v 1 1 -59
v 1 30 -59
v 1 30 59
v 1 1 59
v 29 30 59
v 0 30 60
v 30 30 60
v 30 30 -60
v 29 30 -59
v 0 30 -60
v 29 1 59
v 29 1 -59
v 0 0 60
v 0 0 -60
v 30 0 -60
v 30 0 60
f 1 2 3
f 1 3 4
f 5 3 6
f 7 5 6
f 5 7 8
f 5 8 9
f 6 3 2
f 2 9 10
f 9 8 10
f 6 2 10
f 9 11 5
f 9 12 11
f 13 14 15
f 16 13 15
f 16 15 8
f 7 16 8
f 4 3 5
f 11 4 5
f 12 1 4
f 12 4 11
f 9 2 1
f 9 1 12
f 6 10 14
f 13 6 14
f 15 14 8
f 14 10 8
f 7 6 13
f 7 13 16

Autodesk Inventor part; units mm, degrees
ref_plane "YZ Plane" through (0, 0, 0) normal (1, 0, 0) x (0, 1, 0)
ref_plane "XY Plane" through (0, 0, 0) normal (0, 0, 1) x (1, 0, 0)
sketch "Sketch1" plane through (0, 0, 0) normal (0, 0, 1) x (1, 0, 0)
  line L0 (0, 0) -> (30, 0)
  line L1 (30, 0) -> (30, 30)
  line L2 (30, 30) -> (0, 30)
  line L3 (0, 30) -> (0, 0)
  dimension "d0" = 30
  dimension "d1" = 30
extrude "Extrusion1" add sketch "Sketch1" along normal mid plane 120
ref_plane "Work Plane1" through (0, 15, 0) normal (0, 1, 0) x (-1, 0, 0)
split body "Split1" result two bodies by plane through (0, 15, 0) normal (0, 1, 0) first body at (20, 15.5, -20)
combine bodies "Combine1" operation type add bodies to combine 3 2
shell "Shell1" thickness 1 removed faces 1 at (10, 30, 20) bodies 2
properties part number "excersise 3"
